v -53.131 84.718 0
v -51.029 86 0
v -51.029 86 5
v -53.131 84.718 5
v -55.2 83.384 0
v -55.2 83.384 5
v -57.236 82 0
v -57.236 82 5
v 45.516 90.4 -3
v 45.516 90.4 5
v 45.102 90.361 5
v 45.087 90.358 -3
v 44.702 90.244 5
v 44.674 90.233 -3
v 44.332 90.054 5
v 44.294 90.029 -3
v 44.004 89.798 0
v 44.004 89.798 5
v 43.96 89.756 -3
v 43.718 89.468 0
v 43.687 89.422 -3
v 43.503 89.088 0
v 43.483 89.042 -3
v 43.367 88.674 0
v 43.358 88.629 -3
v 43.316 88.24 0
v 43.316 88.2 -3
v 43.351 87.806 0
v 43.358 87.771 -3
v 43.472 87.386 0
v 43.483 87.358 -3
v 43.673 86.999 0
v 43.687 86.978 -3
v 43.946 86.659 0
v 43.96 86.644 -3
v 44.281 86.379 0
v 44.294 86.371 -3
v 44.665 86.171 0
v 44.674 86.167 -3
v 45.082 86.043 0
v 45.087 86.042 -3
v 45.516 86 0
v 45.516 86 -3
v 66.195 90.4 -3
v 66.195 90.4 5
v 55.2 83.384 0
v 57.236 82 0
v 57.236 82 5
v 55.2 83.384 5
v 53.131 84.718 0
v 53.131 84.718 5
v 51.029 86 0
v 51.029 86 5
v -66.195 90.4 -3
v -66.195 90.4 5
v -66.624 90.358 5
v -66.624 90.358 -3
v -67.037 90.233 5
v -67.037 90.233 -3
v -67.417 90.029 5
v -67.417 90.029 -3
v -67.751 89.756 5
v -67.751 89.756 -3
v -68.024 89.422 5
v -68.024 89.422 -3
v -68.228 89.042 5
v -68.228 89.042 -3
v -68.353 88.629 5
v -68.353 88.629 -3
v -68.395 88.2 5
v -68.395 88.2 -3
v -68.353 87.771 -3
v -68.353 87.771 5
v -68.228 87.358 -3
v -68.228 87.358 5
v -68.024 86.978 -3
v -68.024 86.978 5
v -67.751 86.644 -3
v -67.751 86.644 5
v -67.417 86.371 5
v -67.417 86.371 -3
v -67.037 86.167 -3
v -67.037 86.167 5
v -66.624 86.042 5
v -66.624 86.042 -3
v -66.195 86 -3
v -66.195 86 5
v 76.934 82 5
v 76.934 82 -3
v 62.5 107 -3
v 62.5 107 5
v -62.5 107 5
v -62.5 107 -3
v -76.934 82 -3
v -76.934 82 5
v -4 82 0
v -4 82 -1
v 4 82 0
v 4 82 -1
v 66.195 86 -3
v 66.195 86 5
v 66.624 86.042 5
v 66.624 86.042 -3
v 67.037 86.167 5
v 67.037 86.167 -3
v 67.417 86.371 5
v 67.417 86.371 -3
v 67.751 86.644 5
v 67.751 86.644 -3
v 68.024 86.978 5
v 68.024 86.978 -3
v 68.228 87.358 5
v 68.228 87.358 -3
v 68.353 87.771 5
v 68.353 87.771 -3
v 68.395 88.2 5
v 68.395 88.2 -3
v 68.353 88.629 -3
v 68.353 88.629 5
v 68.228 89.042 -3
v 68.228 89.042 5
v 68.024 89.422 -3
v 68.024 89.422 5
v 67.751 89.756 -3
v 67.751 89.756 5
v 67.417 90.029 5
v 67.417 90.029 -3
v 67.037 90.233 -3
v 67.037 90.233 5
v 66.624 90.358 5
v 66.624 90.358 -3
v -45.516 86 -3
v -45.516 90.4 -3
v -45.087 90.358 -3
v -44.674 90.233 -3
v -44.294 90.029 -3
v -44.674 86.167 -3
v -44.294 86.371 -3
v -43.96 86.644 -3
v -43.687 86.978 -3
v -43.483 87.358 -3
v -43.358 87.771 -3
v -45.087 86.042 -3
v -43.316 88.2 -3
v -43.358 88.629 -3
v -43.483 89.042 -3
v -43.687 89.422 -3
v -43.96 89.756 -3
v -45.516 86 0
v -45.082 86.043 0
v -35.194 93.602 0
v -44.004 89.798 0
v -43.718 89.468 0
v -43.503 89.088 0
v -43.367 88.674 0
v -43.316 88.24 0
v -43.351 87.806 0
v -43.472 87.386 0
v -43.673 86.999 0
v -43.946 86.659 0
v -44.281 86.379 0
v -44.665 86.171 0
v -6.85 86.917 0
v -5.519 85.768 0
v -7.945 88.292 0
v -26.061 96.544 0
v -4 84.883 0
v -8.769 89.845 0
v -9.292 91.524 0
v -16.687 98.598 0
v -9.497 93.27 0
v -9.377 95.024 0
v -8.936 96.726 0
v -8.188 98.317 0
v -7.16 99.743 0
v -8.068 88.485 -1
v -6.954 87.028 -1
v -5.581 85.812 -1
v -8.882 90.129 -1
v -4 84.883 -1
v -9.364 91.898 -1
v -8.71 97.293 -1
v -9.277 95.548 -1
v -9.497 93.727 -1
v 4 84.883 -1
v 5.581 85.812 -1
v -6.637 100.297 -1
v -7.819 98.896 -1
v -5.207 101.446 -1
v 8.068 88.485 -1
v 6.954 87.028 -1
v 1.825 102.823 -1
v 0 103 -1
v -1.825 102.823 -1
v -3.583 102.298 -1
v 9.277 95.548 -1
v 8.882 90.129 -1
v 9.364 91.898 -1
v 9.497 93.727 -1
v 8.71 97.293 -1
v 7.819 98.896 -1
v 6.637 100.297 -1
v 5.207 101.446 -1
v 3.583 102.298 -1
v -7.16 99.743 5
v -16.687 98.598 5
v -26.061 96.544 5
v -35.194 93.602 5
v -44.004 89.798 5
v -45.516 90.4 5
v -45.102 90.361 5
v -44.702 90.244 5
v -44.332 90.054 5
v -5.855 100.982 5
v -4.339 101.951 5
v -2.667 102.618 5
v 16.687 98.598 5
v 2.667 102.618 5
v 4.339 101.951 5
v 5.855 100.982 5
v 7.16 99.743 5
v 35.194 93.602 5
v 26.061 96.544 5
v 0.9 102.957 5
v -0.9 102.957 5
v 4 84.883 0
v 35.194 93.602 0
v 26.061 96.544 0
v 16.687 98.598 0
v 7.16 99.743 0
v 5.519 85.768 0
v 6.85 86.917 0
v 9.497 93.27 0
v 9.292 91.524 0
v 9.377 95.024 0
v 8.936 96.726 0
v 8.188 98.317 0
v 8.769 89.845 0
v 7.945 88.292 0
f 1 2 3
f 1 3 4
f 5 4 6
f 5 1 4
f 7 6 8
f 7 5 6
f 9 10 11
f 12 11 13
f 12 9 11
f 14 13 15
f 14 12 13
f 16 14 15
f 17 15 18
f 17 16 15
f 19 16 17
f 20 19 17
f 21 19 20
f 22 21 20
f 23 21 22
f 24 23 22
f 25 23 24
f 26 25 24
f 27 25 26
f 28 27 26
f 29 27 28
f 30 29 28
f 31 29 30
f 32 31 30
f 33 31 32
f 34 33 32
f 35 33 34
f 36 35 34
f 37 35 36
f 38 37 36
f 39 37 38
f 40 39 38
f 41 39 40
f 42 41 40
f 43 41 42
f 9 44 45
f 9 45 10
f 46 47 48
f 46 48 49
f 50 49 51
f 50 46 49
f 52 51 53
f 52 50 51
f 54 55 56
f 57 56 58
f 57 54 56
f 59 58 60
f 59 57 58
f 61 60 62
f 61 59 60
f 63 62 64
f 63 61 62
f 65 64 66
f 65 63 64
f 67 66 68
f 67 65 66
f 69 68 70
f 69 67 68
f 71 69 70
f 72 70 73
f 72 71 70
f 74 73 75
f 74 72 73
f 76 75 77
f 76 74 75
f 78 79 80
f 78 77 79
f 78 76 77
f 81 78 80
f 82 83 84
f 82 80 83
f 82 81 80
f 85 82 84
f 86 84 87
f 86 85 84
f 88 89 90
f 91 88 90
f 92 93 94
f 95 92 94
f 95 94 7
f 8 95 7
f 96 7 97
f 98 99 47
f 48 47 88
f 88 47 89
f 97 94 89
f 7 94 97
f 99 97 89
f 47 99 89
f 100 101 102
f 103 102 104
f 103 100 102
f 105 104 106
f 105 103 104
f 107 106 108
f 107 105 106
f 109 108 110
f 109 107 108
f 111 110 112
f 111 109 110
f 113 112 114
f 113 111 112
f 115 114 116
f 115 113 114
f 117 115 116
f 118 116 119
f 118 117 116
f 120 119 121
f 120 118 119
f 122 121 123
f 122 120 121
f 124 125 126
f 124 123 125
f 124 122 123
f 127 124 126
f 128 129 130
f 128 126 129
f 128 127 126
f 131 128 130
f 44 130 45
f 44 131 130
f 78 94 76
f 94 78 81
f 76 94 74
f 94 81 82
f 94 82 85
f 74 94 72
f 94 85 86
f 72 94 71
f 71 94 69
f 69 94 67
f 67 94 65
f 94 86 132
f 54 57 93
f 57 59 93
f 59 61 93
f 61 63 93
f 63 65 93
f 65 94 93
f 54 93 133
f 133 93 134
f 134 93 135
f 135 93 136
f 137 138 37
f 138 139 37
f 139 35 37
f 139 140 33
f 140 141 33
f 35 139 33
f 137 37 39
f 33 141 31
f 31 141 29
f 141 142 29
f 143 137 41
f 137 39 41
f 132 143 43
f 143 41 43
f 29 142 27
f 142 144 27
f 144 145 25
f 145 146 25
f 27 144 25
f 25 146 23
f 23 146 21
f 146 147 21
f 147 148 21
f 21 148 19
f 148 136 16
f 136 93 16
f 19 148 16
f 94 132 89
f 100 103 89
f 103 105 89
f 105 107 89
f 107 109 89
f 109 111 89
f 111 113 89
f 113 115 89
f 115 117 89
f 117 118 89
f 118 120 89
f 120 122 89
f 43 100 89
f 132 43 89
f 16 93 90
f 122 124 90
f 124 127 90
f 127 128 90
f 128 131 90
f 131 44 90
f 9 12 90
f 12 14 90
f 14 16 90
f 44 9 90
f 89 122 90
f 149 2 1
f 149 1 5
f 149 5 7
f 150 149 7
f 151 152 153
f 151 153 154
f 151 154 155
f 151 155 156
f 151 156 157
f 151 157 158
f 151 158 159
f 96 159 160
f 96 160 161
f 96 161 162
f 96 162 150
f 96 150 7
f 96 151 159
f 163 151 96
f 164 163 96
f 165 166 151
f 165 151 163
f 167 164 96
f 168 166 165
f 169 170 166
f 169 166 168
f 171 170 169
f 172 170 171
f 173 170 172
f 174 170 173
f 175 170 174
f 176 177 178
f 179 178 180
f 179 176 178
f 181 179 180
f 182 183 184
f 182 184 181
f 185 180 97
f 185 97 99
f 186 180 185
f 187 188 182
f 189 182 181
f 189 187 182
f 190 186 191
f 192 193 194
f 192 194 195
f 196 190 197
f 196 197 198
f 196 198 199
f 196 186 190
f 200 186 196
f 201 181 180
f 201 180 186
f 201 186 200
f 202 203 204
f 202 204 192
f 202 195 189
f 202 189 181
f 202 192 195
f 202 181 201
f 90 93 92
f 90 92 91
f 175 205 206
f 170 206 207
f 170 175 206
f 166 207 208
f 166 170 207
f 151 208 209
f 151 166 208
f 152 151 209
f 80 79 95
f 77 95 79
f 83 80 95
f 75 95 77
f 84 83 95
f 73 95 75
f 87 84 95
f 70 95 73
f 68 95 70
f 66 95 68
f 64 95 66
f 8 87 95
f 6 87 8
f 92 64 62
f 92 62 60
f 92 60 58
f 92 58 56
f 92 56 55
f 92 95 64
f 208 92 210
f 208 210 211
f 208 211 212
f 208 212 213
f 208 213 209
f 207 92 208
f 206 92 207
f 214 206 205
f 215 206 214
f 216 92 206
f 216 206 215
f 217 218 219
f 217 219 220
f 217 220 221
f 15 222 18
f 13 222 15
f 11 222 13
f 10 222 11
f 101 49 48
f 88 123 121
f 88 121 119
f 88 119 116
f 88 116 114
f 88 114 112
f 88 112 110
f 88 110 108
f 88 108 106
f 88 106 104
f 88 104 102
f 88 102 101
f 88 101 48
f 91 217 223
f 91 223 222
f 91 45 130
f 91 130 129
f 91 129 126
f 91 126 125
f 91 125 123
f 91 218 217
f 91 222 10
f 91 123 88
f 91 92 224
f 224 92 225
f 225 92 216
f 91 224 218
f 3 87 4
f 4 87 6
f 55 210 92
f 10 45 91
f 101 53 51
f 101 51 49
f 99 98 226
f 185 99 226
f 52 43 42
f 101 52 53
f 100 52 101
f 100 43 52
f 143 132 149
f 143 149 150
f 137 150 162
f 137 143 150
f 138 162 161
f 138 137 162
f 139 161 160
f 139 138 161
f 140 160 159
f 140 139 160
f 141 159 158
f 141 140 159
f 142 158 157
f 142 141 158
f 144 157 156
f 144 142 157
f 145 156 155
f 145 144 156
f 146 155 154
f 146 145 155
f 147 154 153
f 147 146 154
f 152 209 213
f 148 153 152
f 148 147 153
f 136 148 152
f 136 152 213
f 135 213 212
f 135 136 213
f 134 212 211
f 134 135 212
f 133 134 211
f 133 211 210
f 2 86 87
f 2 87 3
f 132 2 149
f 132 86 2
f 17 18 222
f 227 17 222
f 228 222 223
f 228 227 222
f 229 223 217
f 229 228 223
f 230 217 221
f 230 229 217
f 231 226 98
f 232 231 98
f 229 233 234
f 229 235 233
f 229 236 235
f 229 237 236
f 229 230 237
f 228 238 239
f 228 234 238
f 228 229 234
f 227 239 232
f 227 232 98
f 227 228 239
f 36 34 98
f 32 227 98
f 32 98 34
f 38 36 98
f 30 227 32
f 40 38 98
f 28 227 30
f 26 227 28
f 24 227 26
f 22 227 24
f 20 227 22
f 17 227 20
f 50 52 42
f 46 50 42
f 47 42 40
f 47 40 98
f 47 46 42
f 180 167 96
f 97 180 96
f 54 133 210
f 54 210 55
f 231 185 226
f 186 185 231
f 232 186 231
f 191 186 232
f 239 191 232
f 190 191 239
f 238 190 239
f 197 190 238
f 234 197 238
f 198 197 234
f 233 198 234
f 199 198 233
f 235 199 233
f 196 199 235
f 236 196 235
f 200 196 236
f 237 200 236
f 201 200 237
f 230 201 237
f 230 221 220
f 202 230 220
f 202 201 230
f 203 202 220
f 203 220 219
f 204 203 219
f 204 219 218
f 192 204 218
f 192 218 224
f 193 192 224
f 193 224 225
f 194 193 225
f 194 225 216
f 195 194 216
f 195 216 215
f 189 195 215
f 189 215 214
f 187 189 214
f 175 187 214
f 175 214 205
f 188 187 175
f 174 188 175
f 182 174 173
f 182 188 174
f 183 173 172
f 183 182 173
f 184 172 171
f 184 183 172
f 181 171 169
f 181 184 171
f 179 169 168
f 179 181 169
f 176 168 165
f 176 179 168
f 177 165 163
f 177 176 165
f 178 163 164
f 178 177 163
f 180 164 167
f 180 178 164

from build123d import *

# Parameters (mm, degrees)
F2_W          = 125
F2_H          = 25
F3_DEPTH      = 8
F4_DEPTH      = 25
F6_DEPTH      = 1
F6_DEPTH_BACK = 25
F8_DEPTH      = 5
F10_DEPTH     = 25


with BuildPart() as f3:
    # F2 (on offset) → F3 (new body)
    with BuildSketch(Plane.XY.offset(-3)):
        with Locations((0, 94.5)):
            Rectangle(F2_W, F2_H)
        Polygon((-62.5, 82), (-62.5, 107), (-76.9337567297, 82), align=None)
        Polygon((76.9337567297, 82), (62.5, 107), (62.5, 82), align=None)
    extrude(amount=F3_DEPTH)

    # F0 (on Top) → F4 (cut)
    with BuildSketch(Plane.XY):
        with BuildLine():
            Line((-90.4997997897, 42.5415824579), (90.4997997897, 42.5415824579))
            ThreePointArc((90.4997997897, 42.5415824579), (0, 100), (-90.4997997897, 42.5415824579))
        make_face()
    extrude(amount=F4_DEPTH, mode=Mode.SUBTRACT)

    # F5 (on Top) → F6 (cut, two sides)
    with BuildSketch(Plane.XY) as f6_sk:
        with BuildLine():
            Line((4, 82), (4, 84.8831560302))
            ThreePointArc((4, 84.8831560302), (0, 103), (-4, 84.8831560302))
            Line((-4, 84.8831560302), (-4, 82))
            Line((-4, 82), (4, 82))
        make_face()
    extrude(amount=-F6_DEPTH, mode=Mode.SUBTRACT)
    extrude(f6_sk.sketch, amount=F6_DEPTH_BACK, mode=Mode.SUBTRACT)

    # F7 (on face) → F8 (cut)
    with BuildSketch(Plane.XY.offset(5)):
        with BuildLine():
            Line((62.5, 207), (58.7661641518, 207))
            ThreePointArc((58.7661641518, 207), (49.6095920415, 196.0748240465), (51.8682665386, 182))
            Line((51.8682665386, 182), (76.9337567297, 182))
            Line((76.9337567297, 182), (62.5, 207))
        make_face()
        with BuildLine():
            ThreePointArc((-51.8682665386, 182), (-49.6095920415, 196.0748240465), (-58.7661641518, 207))
            Line((-58.7661641518, 207), (-62.5, 207))
            Line((-62.5, 207), (-76.9337567297, 182))
            Line((-76.9337567297, 182), (-51.8682665386, 182))
        make_face()
    extrude(amount=-F8_DEPTH, mode=Mode.SUBTRACT)

    # F9 (on offset) → F10 (cut)
    with BuildSketch(Plane.XY.offset(-3)):
        with BuildLine():
            Line((55.8554306626, 86), (66.1950417228, 86))
            ThreePointArc((66.1950417228, 86), (68.3950417228, 88.2), (66.1950417228, 90.4))
            Line((66.1950417228, 90.4), (55.8554306626, 90.4))
            Line((55.8554306626, 90.4), (45.5158196025, 90.4))
            ThreePointArc((45.5158196025, 90.4), (43.3158196025, 88.2), (45.5158196025, 86))
            Line((45.5158196025, 86), (55.8554306626, 86))
        make_face()
        with BuildLine():
            ThreePointArc((-66.1950417228, 90.4), (-68.3950417228, 88.2), (-66.1950417228, 86))
            Line((-66.1950417228, 86), (-55.8554306626, 86))
            Line((-55.8554306626, 86), (-45.5158196025, 86))
            ThreePointArc((-45.5158196025, 86), (-43.3158196025, 88.2), (-45.5158196025, 90.4))
            Line((-45.5158196025, 90.4), (-55.8554306626, 90.4))
            Line((-55.8554306626, 90.4), (-66.1950417228, 90.4))
        make_face()
    extrude(amount=F10_DEPTH, mode=Mode.SUBTRACT)


solid = f3.part
